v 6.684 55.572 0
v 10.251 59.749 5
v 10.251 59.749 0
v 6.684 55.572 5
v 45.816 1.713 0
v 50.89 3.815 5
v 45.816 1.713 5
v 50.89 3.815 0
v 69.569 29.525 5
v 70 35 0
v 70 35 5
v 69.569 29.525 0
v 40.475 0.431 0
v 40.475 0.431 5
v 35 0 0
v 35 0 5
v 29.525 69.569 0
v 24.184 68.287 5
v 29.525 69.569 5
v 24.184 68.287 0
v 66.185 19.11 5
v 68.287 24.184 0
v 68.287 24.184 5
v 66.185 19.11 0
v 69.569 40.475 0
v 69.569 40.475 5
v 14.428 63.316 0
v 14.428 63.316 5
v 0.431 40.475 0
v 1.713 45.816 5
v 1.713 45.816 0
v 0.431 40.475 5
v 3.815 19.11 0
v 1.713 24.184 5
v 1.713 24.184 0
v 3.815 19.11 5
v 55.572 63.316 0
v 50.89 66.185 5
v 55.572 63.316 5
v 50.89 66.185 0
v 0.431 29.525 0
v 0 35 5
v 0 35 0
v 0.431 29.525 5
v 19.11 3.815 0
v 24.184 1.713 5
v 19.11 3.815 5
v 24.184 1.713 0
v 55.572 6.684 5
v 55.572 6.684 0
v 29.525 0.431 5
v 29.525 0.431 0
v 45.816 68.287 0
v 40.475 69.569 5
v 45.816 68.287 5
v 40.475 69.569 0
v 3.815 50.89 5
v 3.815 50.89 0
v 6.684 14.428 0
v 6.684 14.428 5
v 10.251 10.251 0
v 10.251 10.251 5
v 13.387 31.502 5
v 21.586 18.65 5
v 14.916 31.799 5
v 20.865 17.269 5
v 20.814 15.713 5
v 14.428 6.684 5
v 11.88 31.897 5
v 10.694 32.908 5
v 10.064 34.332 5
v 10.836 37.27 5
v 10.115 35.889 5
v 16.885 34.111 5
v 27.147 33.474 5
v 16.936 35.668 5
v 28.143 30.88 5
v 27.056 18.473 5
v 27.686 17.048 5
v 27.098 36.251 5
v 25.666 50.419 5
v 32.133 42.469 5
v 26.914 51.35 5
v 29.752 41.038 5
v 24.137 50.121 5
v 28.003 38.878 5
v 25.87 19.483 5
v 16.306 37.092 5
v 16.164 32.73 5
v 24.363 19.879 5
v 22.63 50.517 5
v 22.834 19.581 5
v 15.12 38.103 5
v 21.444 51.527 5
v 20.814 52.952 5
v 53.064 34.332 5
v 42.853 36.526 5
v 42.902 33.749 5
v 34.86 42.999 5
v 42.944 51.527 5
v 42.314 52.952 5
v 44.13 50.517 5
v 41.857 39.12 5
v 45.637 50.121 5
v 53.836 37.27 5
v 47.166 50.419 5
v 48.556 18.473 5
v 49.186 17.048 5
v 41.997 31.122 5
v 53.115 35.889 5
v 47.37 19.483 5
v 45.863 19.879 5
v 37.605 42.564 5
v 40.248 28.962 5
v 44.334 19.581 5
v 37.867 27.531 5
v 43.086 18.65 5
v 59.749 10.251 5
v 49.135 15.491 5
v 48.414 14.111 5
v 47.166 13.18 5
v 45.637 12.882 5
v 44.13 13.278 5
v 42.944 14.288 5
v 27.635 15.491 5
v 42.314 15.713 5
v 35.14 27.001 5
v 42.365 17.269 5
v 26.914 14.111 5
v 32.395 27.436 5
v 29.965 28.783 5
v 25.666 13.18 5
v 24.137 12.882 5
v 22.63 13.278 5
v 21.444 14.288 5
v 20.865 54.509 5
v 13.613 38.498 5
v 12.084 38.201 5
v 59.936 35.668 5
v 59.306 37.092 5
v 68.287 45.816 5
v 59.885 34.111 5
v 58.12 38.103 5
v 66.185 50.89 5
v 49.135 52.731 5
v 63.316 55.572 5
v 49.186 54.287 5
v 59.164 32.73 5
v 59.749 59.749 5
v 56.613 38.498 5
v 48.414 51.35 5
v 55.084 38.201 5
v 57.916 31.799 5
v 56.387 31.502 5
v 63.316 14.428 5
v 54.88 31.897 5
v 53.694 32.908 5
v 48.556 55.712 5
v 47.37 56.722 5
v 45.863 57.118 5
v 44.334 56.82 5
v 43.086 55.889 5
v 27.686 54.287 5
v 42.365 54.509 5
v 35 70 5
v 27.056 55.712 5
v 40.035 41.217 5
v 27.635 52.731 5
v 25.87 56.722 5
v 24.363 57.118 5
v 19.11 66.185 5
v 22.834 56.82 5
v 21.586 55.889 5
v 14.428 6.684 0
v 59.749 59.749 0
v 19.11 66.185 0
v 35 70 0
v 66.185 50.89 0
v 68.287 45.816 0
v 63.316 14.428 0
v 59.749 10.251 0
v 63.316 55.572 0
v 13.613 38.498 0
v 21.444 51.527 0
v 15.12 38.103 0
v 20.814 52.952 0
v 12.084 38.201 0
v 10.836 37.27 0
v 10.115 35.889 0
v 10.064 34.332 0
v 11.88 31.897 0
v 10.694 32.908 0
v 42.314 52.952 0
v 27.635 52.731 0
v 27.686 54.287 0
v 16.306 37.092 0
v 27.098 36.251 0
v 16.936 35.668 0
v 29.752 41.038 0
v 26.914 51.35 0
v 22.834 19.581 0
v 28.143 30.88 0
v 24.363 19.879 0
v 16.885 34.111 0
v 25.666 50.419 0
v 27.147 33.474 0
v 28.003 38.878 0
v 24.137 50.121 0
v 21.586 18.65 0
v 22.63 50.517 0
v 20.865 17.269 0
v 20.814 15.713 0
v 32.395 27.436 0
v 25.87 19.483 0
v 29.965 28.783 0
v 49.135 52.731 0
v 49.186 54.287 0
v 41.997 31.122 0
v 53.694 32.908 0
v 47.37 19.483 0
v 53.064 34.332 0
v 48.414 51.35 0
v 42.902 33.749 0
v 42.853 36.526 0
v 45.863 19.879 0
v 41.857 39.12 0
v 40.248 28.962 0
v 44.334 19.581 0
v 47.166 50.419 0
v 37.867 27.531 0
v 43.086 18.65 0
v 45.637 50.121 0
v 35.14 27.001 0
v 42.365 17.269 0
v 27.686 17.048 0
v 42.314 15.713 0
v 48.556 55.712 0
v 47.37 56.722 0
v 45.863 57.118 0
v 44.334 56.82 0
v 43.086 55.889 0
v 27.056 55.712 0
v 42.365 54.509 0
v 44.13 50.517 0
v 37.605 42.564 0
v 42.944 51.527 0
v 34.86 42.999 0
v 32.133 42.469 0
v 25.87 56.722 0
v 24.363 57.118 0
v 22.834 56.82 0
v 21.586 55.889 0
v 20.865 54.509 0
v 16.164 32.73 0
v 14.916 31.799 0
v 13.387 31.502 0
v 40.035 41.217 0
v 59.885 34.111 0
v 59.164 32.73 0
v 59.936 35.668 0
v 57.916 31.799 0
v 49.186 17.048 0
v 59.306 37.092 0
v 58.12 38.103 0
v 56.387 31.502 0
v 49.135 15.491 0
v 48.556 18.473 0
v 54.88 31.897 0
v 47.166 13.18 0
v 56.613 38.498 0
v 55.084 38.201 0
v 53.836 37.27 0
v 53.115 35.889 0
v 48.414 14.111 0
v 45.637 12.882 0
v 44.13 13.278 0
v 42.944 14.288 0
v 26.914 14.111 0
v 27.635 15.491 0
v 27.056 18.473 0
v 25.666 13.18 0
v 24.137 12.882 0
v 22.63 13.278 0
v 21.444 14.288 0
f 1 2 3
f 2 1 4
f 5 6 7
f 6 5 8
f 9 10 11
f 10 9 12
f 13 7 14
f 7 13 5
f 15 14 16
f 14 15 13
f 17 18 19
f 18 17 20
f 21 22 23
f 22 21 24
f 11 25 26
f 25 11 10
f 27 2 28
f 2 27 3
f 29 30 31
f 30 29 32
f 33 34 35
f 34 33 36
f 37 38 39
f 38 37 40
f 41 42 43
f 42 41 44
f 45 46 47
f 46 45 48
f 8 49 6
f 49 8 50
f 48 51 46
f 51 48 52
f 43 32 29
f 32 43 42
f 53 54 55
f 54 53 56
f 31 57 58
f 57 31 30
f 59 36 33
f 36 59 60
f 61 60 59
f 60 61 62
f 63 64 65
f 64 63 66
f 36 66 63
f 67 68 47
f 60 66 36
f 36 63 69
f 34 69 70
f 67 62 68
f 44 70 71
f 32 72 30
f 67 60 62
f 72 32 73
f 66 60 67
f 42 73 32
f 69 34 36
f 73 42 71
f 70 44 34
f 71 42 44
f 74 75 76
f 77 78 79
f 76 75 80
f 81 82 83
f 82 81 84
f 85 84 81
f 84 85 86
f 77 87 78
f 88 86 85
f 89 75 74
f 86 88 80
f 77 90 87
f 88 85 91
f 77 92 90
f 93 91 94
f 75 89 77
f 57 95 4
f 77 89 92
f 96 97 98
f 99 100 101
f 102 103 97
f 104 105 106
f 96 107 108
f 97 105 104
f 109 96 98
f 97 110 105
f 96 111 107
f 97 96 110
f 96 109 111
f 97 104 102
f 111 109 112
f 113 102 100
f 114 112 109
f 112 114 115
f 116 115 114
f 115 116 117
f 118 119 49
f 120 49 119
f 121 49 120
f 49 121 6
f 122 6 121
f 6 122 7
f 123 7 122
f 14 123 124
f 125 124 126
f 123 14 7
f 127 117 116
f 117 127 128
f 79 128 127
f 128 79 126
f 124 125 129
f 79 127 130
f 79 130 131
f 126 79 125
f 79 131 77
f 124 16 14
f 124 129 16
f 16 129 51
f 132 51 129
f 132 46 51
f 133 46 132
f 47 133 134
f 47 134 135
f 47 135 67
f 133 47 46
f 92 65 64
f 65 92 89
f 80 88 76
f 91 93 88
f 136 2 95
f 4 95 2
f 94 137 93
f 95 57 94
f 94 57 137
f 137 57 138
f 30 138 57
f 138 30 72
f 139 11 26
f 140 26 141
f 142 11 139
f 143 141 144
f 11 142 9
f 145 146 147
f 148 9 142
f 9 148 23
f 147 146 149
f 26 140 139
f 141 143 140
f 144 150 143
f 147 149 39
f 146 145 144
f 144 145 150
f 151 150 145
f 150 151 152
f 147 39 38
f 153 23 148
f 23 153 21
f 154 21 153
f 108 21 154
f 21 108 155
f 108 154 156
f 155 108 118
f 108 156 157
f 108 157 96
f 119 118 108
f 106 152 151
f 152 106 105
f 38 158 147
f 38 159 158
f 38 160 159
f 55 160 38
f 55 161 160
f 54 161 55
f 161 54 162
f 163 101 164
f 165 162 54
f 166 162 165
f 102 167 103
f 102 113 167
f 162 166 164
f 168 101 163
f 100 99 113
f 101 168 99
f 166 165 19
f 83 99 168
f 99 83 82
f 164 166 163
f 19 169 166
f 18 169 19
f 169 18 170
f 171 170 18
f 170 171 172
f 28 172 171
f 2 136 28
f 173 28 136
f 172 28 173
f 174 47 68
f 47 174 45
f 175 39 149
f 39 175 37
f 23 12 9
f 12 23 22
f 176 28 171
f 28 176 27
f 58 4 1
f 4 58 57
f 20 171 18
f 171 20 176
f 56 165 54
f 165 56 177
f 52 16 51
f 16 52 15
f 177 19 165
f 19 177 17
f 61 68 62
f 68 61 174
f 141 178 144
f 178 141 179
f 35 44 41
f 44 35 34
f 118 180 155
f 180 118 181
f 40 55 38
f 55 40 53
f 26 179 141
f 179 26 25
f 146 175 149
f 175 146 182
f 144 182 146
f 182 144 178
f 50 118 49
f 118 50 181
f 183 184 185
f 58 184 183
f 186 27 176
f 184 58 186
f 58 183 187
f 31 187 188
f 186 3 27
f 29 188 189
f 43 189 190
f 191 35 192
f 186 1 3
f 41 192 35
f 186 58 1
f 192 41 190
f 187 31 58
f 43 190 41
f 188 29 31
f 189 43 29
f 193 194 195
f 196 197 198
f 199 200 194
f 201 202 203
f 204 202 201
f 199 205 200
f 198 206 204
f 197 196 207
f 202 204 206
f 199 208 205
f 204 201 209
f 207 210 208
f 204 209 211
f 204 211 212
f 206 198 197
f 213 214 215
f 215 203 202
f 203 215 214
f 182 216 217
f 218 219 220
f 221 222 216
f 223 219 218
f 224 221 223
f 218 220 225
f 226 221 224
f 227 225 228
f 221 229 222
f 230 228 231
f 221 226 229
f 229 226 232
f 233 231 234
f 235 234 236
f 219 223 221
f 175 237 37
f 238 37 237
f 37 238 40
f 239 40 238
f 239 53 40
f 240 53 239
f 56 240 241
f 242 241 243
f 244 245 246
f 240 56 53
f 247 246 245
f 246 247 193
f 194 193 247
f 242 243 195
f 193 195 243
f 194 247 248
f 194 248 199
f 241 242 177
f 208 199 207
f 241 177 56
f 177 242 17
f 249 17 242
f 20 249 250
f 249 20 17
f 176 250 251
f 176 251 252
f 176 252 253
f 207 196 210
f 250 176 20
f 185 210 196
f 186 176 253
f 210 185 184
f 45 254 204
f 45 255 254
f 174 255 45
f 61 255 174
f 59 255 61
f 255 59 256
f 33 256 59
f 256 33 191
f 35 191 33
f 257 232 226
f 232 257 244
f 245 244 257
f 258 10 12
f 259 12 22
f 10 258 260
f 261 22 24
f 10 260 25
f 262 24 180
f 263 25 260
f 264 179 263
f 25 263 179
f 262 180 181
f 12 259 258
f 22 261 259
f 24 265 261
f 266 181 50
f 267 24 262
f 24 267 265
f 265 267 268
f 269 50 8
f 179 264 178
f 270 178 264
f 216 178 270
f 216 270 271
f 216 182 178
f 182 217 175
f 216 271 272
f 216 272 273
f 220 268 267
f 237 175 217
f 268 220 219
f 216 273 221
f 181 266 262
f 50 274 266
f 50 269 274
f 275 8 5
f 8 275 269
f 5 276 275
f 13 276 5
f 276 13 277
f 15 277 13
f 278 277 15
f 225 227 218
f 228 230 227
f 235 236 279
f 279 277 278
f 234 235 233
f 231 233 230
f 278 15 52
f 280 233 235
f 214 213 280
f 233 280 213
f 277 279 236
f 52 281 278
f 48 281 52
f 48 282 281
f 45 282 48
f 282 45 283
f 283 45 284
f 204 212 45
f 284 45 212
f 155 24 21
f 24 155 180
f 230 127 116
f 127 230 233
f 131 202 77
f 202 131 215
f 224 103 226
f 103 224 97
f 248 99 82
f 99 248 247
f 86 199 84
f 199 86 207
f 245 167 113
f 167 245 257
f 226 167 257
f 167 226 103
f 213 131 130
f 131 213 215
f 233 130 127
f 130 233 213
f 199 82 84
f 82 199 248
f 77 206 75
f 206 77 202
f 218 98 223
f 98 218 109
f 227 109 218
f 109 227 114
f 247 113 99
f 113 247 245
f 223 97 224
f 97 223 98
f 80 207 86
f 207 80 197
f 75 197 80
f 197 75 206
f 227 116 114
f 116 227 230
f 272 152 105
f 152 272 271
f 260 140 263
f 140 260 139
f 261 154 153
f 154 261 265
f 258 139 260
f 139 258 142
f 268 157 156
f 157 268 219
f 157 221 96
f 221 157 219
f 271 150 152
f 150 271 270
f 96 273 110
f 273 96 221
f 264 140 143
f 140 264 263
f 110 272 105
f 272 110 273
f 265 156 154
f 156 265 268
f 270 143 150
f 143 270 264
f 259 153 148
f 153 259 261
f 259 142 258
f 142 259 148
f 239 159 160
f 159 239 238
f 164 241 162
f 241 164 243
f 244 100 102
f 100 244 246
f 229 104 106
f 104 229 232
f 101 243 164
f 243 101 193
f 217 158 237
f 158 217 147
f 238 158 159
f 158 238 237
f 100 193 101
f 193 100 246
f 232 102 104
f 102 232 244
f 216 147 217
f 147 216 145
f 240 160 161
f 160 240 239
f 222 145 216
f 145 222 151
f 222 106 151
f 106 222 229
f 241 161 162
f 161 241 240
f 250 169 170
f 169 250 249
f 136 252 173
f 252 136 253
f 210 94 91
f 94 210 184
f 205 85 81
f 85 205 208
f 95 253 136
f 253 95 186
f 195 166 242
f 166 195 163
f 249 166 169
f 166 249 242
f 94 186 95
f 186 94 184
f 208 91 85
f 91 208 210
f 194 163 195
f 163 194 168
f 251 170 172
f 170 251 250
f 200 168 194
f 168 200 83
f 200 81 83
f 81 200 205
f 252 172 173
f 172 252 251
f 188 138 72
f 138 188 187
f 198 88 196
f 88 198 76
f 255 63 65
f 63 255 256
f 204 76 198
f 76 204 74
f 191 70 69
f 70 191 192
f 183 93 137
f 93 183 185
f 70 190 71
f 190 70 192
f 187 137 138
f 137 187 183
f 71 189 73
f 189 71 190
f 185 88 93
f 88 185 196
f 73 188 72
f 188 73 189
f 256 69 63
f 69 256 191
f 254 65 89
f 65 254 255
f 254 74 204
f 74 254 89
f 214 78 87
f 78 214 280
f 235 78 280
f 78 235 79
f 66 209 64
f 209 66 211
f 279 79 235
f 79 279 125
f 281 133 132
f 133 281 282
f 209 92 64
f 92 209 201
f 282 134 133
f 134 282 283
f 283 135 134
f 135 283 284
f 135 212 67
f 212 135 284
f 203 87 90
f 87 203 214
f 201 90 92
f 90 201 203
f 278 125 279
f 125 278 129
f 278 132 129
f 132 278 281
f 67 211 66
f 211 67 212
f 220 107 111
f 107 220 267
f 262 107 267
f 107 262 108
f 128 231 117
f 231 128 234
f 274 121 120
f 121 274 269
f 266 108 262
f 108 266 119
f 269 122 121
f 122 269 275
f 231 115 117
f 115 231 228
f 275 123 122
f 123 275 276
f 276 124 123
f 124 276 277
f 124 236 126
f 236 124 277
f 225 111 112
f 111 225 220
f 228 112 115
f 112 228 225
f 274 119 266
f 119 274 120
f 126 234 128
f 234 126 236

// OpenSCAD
$fn = 32;

// ----------------------------------------------------------------------
// Spacer plate: round flange R35, 6 bolts
// ----------------------------------------------------------------------

// --- parameters (mm) ---
bore_r = 8;               // centre bore radius
bolt_r = 3.5;             // bolt hole radius
plate_t = 5;              // plate thickness, Z (extrusion height)
flange_r = 35;            // flange radius
n_bolt = 6;               // bolt hole count
ring_r = 21.5;            // bolt circle radius

profile = [[70, 35], [69.569, 40.475], [68.287, 45.816], [66.185, 50.89], [63.316, 55.572], [59.749, 59.749], [55.572, 63.316], [50.89, 66.185], [45.816, 68.287], [40.475, 69.569], [35, 70], [29.525, 69.569], [24.184, 68.287], [19.11, 66.185], [14.428, 63.316], [10.251, 59.749], [6.684, 55.572], [3.815, 50.89], [1.713, 45.816], [0.431, 40.475], [0, 35], [0.431, 29.525], [1.713, 24.184], [3.815, 19.11], [6.684, 14.428], [10.251, 10.251], [14.428, 6.684], [19.11, 3.815], [24.184, 1.713], [29.525, 0.431], [35, 0], [40.475, 0.431], [45.816, 1.713], [50.89, 3.815], [55.572, 6.684], [59.749, 10.251], [63.316, 14.428], [66.185, 19.11], [68.287, 24.184], [69.569, 29.525]];  // primary outline, 40 points, counter clockwise
void_1 = [[42.853, 36.526], [41.857, 39.12], [40.035, 41.217], [37.605, 42.564], [34.86, 42.999], [32.133, 42.469], [29.752, 41.038], [28.003, 38.878], [27.098, 36.251], [27.147, 33.474], [28.143, 30.88], [29.965, 28.783], [32.395, 27.436], [35.14, 27.001], [37.867, 27.531], [40.248, 28.962], [41.997, 31.122], [42.902, 33.749]];  // centre bore, 18 points
void_2 = [[59.936, 35.668], [59.306, 37.092], [58.12, 38.103], [56.613, 38.498], [55.084, 38.201], [53.836, 37.27], [53.115, 35.889], [53.064, 34.332], [53.694, 32.908], [54.88, 31.897], [56.387, 31.502], [57.916, 31.799], [59.164, 32.73], [59.885, 34.111]];  // bolt hole 1, 14 points
void_3 = [[49.186, 54.287], [48.556, 55.712], [47.37, 56.722], [45.863, 57.118], [44.334, 56.82], [43.086, 55.889], [42.365, 54.509], [42.314, 52.952], [42.944, 51.527], [44.13, 50.517], [45.637, 50.121], [47.166, 50.419], [48.414, 51.35], [49.135, 52.731]];  // bolt hole 2, 14 points
void_4 = [[27.686, 54.287], [27.056, 55.712], [25.87, 56.722], [24.363, 57.118], [22.834, 56.82], [21.586, 55.889], [20.865, 54.509], [20.814, 52.952], [21.444, 51.527], [22.63, 50.517], [24.137, 50.121], [25.666, 50.419], [26.914, 51.35], [27.635, 52.731]];  // bolt hole 3, 14 points
void_5 = [[16.936, 35.668], [16.306, 37.092], [15.12, 38.103], [13.613, 38.498], [12.084, 38.201], [10.836, 37.27], [10.115, 35.889], [10.064, 34.332], [10.694, 32.908], [11.88, 31.897], [13.387, 31.502], [14.916, 31.799], [16.164, 32.73], [16.885, 34.111]];  // bolt hole 4, 14 points
void_6 = [[27.686, 17.048], [27.056, 18.473], [25.87, 19.483], [24.363, 19.879], [22.834, 19.581], [21.586, 18.65], [20.865, 17.269], [20.814, 15.713], [21.444, 14.288], [22.63, 13.278], [24.137, 12.882], [25.666, 13.18], [26.914, 14.111], [27.635, 15.491]];  // bolt hole 5, 14 points
void_7 = [[49.186, 17.048], [48.556, 18.473], [47.37, 19.483], [45.863, 19.879], [44.334, 19.581], [43.086, 18.65], [42.365, 17.269], [42.314, 15.713], [42.944, 14.288], [44.13, 13.278], [45.637, 12.882], [47.166, 13.18], [48.414, 14.111], [49.135, 15.491]];  // bolt hole 6, 14 points

// --- the one profile operation ---
difference() {
  linear_extrude(height = plate_t) polygon(points = profile);
  translate([0, 0, -1])
    linear_extrude(height = plate_t + 2) polygon(points = void_1);
  translate([0, 0, -1])
    linear_extrude(height = plate_t + 2) polygon(points = void_2);
  translate([0, 0, -1])
    linear_extrude(height = plate_t + 2) polygon(points = void_3);
  translate([0, 0, -1])
    linear_extrude(height = plate_t + 2) polygon(points = void_4);
  translate([0, 0, -1])
    linear_extrude(height = plate_t + 2) polygon(points = void_5);
  translate([0, 0, -1])
    linear_extrude(height = plate_t + 2) polygon(points = void_6);
  translate([0, 0, -1])
    linear_extrude(height = plate_t + 2) polygon(points = void_7);
}
